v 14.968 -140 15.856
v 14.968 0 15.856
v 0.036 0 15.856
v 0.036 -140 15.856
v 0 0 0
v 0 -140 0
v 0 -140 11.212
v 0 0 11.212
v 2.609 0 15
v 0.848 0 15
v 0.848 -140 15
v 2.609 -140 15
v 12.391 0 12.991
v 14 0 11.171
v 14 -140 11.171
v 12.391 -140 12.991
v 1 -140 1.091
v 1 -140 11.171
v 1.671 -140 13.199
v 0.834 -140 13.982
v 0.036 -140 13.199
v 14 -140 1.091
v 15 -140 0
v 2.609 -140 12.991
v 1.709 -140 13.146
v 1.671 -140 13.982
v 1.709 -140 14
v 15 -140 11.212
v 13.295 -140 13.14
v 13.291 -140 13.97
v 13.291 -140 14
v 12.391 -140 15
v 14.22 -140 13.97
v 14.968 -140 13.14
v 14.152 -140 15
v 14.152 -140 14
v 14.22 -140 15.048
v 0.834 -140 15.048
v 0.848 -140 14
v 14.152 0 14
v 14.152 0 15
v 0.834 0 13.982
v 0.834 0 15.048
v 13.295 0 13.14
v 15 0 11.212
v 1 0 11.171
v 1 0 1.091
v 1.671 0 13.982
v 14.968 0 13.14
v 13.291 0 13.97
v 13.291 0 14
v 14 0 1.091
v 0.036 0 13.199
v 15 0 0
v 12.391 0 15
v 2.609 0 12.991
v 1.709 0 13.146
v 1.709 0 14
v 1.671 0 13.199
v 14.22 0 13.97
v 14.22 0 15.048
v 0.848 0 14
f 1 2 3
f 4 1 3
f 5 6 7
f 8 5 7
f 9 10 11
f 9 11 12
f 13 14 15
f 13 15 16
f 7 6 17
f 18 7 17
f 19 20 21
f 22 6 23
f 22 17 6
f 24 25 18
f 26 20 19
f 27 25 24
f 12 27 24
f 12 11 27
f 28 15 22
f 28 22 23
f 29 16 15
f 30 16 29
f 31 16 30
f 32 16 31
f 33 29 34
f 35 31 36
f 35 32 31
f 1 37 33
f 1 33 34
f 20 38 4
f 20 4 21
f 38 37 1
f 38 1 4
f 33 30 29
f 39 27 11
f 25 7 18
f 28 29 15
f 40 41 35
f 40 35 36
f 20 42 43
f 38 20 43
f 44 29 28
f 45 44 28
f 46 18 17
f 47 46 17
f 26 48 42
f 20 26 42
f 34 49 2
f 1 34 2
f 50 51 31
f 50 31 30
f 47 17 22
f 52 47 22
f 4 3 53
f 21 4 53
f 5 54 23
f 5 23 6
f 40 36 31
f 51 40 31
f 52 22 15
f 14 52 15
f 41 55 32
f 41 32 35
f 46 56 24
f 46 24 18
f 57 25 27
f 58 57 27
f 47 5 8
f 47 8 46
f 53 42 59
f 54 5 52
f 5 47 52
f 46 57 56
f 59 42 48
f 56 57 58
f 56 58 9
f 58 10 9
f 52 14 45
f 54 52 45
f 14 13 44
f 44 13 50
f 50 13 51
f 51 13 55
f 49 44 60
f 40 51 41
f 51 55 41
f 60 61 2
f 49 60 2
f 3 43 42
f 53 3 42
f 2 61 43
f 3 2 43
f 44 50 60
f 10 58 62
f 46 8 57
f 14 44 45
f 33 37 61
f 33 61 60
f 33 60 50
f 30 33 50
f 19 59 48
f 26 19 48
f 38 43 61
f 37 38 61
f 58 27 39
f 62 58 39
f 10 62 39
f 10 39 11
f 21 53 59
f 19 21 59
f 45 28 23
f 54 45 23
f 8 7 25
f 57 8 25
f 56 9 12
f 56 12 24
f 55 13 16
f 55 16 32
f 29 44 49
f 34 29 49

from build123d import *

# Parameters (mm, degrees)
PAD_DEPTH    = 140
PAD001_DEPTH = 140


with BuildPart() as part:
    # Sketch → Pad (new body)
    with BuildSketch(Plane.XZ):
        Polygon((1.709151, 14), (0.847738, 14), (0.847738, 15), (2.609062, 15), (2.609062, 12.991093), (1, 11.170912), (1, 1.090989), (14, 1.090989), (14, 11.170912), (12.390938, 12.991093), (12.390938, 15), (14.152262, 15), (14.152262, 14), (13.290849, 14), (13.290849, 13.145577), (15, 11.212176), (15, 0), (0, 0), (0, 11.212176), (1.709151, 13.145577), align=None)
    extrude(amount=PAD_DEPTH)

    # Sketch001 → Pad001 (join)
    with BuildSketch(Plane.XZ):
        Polygon((1.670899, 13.98237), (0.833981, 13.98237), (0.833981, 15.0478), (14.219909, 15.0478), (14.219909, 13.970164), (13.277989, 13.970164), (13.277989, 13.140446), (14.96773, 13.140446), (14.96773, 15.855778), (0.035527, 15.855778), (0.035527, 13.198529), (1.670899, 13.198529), align=None)
    extrude(amount=PAD001_DEPTH)


solid = part.part
